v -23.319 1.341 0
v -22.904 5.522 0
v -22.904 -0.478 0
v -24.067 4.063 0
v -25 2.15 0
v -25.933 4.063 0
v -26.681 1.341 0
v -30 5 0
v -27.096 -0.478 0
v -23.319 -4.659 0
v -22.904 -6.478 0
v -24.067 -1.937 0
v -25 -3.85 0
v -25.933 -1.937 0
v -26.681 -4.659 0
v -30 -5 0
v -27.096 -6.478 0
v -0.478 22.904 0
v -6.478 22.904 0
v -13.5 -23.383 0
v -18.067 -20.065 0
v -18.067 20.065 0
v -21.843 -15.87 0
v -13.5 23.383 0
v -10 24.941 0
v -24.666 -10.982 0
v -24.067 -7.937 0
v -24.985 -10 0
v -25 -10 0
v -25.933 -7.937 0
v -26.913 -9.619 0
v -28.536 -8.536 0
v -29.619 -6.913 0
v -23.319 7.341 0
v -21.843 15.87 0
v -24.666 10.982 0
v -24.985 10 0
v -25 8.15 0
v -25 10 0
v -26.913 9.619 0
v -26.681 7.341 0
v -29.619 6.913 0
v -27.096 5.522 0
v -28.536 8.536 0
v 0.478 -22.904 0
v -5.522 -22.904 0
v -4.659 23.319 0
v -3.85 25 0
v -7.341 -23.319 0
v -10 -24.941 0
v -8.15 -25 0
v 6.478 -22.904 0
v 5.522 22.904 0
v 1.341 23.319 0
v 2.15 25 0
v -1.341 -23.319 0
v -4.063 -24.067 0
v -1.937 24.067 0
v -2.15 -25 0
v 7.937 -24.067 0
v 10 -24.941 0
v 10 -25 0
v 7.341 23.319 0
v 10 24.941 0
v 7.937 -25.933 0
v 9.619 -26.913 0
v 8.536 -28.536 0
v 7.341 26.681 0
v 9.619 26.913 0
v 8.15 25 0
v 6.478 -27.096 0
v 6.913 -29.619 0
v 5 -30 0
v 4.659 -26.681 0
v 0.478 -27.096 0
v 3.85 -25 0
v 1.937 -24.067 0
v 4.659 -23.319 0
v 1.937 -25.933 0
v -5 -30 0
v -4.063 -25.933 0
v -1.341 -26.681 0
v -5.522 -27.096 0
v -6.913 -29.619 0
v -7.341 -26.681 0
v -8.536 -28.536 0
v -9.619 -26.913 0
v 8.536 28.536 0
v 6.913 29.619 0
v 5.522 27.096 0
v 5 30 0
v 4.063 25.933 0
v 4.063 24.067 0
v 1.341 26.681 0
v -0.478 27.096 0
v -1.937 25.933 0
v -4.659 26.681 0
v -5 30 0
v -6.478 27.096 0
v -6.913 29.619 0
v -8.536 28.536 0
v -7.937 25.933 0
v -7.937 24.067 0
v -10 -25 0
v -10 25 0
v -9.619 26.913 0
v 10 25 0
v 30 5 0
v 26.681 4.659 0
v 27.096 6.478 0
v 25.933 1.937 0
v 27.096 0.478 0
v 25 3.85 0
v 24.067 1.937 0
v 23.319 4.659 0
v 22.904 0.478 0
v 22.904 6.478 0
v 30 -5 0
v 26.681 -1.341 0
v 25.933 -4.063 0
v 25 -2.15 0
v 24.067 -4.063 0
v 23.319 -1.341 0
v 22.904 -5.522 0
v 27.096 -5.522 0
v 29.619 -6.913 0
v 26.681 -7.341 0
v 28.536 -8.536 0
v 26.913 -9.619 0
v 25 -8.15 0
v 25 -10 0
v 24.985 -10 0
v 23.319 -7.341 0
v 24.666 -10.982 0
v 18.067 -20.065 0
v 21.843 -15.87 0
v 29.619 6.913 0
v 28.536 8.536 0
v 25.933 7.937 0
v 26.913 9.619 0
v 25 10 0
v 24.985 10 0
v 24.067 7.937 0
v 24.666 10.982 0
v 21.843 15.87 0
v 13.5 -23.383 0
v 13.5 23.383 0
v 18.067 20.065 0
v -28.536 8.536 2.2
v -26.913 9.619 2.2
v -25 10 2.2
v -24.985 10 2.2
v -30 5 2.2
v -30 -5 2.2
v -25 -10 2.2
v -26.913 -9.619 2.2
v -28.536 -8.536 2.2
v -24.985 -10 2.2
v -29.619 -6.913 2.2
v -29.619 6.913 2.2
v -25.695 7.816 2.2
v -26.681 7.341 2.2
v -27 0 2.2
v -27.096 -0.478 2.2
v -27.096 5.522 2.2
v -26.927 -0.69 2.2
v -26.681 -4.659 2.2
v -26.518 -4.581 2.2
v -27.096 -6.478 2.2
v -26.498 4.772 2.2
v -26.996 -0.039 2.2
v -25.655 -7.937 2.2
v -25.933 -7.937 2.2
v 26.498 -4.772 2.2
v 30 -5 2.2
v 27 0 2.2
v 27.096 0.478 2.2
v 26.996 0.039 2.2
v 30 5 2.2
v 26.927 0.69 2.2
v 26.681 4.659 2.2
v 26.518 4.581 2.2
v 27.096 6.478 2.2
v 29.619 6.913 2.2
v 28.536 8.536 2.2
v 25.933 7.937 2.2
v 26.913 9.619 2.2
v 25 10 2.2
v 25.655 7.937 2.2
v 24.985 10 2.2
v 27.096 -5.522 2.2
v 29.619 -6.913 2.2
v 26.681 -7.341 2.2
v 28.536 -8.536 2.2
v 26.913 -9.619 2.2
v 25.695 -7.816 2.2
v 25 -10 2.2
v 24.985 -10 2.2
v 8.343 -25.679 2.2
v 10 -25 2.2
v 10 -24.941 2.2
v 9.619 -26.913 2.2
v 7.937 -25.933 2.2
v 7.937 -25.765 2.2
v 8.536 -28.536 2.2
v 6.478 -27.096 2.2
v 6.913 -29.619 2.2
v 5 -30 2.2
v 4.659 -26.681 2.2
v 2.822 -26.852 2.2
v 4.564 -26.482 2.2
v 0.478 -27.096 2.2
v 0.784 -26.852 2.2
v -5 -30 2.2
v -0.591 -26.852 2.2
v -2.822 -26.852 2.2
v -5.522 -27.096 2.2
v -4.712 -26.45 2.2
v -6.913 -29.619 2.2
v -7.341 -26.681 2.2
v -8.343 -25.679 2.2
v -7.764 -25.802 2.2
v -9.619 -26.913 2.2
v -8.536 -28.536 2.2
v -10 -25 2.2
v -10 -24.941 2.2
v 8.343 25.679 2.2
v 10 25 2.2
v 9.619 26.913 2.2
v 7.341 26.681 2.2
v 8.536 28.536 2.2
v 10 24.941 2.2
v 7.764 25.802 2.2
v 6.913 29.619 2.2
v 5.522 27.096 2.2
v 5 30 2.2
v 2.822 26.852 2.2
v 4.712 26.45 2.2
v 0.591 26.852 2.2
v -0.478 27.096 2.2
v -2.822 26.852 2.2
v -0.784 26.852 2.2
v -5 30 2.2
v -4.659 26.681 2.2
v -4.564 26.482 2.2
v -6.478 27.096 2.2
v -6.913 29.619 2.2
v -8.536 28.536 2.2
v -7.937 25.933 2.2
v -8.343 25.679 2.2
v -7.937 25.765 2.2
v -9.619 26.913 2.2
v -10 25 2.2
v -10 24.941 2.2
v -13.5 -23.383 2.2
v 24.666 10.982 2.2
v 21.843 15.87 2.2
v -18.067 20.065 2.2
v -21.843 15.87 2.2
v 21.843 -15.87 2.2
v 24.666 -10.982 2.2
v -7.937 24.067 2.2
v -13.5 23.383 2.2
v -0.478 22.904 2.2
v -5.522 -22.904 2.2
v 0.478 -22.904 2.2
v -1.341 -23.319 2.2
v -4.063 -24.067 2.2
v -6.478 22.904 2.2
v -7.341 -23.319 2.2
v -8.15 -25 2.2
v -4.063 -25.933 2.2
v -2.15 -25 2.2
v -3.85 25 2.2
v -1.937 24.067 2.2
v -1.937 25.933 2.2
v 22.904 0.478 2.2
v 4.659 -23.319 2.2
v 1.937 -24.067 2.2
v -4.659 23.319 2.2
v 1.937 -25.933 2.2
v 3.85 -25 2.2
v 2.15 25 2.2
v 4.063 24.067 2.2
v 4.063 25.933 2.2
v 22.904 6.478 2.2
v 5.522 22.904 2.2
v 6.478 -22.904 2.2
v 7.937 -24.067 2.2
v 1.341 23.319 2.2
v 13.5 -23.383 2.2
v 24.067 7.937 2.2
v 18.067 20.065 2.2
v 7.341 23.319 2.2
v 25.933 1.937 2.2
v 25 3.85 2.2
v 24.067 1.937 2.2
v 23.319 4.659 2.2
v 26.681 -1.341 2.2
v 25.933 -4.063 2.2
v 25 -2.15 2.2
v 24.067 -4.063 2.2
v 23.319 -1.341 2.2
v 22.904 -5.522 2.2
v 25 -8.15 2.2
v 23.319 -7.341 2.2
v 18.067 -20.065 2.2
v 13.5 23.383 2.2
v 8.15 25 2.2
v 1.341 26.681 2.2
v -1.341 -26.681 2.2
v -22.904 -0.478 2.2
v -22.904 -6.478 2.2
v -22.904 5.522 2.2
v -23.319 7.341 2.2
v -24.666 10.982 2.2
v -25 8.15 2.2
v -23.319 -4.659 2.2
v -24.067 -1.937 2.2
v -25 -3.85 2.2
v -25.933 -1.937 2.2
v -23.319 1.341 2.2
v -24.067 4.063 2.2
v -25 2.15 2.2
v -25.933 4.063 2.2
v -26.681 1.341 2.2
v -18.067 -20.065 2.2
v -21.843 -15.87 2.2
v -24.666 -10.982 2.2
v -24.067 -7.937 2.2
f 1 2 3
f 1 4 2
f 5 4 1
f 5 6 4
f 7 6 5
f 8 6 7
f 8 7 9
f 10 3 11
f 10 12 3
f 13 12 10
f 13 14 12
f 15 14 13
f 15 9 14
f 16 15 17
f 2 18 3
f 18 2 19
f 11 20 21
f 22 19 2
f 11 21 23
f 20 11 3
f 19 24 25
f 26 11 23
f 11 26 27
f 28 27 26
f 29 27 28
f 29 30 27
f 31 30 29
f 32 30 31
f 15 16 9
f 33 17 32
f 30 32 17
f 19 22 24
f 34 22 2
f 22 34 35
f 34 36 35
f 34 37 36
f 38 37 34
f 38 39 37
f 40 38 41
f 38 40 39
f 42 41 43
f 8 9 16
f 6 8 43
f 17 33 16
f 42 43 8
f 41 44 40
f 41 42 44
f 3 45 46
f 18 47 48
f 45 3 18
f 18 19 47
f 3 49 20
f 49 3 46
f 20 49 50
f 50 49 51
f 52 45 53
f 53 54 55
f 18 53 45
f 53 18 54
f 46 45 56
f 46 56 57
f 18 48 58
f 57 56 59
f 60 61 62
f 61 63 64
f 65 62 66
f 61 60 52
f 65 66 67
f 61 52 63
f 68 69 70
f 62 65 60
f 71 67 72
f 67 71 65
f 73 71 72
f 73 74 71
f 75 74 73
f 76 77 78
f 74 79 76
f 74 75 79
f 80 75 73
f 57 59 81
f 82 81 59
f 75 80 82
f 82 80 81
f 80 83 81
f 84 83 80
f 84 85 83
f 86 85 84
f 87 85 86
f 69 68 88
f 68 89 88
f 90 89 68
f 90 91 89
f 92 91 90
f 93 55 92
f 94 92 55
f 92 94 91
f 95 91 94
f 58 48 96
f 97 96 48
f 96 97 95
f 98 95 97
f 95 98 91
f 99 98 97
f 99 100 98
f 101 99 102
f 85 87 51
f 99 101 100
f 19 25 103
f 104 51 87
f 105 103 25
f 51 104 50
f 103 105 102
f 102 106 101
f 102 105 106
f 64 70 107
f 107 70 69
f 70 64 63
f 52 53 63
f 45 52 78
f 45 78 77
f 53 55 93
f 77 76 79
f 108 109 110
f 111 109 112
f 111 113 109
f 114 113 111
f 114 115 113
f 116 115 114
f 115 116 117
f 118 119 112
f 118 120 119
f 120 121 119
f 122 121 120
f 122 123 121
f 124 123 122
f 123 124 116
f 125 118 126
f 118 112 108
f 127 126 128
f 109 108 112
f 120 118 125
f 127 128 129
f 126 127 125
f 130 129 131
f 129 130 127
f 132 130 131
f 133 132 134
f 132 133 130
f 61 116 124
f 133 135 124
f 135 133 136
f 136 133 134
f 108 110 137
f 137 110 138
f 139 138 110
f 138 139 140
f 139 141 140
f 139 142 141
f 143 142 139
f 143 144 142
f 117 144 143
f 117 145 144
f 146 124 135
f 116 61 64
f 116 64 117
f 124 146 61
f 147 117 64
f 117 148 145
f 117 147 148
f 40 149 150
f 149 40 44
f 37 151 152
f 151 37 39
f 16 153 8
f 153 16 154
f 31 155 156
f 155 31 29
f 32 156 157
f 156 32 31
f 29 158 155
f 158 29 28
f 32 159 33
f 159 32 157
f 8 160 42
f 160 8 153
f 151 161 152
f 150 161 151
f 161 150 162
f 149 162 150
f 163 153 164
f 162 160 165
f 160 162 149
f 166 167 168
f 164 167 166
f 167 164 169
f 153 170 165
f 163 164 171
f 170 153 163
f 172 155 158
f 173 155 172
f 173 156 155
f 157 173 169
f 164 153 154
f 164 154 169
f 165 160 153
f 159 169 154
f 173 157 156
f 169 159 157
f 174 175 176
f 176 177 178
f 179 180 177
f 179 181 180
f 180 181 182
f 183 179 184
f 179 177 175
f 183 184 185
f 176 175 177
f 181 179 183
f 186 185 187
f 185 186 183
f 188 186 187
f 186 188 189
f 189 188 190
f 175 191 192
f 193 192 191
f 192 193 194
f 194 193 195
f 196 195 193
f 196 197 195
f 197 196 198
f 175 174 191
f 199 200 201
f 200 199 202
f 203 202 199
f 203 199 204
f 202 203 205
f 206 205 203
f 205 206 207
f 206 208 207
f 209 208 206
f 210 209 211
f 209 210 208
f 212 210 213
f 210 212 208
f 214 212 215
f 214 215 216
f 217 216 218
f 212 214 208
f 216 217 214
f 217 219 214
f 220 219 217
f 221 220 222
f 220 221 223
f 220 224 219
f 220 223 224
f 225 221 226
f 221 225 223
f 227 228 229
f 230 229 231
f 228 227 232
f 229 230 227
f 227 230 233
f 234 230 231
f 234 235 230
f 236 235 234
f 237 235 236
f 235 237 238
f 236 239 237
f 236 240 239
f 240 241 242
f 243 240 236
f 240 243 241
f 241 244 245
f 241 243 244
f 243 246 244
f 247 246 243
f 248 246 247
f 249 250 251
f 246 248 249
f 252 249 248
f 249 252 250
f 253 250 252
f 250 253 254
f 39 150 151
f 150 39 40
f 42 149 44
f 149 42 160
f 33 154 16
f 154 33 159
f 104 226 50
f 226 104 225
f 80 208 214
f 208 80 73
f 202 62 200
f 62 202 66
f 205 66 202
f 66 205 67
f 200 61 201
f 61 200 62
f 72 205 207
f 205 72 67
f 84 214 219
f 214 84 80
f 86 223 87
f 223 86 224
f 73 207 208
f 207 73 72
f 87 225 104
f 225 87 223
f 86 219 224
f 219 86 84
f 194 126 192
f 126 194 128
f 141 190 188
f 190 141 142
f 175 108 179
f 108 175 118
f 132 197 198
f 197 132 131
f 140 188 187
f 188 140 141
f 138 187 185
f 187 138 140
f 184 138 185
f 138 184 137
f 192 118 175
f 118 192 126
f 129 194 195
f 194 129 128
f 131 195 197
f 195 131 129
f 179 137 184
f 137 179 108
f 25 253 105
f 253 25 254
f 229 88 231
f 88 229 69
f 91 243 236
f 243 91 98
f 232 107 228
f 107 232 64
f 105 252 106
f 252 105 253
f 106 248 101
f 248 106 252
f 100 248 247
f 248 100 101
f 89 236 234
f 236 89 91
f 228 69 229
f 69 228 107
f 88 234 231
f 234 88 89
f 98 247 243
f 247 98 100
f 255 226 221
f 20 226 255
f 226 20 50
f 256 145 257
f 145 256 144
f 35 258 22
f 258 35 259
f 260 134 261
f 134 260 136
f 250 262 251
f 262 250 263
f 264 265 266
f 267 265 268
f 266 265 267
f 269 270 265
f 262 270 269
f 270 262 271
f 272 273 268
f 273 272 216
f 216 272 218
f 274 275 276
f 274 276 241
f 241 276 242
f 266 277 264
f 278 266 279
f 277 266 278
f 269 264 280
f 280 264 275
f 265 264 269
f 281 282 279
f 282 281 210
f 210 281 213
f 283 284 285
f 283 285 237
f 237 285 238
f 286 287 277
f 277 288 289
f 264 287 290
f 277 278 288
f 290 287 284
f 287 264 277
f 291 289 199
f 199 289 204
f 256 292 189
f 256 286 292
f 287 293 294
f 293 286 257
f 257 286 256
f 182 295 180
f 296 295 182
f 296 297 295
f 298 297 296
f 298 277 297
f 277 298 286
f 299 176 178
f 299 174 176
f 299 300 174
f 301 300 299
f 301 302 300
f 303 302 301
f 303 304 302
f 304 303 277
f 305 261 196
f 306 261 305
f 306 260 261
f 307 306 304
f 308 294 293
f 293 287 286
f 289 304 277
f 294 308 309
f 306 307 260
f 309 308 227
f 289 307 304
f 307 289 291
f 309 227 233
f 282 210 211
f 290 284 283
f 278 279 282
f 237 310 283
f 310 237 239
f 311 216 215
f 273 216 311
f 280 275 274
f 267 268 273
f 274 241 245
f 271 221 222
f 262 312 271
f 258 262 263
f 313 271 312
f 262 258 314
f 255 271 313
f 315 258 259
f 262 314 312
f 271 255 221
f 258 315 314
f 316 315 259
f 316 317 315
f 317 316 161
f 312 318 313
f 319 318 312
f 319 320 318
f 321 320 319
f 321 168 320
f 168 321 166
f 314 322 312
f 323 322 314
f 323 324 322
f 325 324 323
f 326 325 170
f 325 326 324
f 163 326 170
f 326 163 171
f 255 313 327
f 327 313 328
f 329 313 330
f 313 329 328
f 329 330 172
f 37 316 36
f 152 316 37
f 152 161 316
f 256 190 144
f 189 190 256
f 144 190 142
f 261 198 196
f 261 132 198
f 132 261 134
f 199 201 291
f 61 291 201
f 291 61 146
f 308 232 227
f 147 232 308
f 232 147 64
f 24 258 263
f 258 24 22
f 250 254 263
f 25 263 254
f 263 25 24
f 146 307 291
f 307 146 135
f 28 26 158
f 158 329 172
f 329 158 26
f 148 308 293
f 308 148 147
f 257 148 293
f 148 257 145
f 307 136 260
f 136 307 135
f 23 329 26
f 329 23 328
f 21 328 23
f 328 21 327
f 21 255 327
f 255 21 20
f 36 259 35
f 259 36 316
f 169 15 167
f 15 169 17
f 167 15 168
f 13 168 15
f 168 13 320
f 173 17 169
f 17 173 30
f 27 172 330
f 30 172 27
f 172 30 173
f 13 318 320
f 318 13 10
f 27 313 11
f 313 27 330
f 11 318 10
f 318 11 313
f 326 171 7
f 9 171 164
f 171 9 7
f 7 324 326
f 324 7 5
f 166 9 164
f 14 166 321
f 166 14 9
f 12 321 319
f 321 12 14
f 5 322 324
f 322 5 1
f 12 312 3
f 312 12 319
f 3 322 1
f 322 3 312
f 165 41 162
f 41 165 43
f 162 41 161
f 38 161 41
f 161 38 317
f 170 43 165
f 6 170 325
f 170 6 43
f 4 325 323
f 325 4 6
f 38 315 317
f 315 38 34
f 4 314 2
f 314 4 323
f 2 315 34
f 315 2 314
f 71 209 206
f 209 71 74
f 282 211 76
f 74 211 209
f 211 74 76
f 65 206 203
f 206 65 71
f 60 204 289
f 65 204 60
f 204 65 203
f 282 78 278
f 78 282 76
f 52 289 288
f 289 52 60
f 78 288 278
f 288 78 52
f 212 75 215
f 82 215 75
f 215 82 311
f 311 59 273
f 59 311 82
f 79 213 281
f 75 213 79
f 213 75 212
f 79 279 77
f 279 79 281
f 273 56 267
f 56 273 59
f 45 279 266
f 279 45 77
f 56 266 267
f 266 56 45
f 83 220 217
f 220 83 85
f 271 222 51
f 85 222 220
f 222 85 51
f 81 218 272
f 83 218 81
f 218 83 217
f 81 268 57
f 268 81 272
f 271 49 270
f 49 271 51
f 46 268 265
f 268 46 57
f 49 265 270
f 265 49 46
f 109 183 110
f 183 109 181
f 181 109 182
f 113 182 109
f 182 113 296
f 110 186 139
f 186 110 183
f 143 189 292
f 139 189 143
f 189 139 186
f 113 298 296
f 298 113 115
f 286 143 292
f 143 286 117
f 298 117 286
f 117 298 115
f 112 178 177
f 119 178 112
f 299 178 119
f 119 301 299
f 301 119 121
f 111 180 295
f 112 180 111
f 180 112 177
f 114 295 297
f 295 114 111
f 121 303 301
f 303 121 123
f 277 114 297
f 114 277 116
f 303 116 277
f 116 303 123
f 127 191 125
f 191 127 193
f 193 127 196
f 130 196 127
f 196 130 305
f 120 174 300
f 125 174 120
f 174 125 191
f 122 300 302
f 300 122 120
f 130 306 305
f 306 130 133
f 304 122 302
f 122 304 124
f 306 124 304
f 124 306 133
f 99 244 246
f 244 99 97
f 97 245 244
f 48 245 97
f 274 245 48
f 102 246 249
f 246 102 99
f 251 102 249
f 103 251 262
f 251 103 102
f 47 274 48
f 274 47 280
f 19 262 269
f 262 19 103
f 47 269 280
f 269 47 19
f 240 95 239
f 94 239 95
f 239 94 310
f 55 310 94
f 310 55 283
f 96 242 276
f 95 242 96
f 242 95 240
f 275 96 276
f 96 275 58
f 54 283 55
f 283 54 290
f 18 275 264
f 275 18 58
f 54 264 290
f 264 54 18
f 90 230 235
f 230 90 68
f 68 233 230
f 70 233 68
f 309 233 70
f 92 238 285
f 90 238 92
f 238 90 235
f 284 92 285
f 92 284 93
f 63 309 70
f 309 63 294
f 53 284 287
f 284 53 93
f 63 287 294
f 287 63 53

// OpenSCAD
// file: ../util/rounded.scad
Collisions=false;

// Do a rounded cube
module rounded(x=10, y=10, z=10, r=3, center=false) {
    if (Collisions) {
        translate([0,0,center?(z/2):0])
            cube([x,y,z], center=center);
    } else {
        if (center) {
            translate([-(x/2),-(y/2),0])
                rounded(x, y, z, r);
        } else {
            translate([r,r,0])
                minkowski() {
                    cube([x-2*r,y-2*r,z/2]);
                    cylinder(h=z/2, r=r);
                }
        }
    }
}
// file: ../models/ollo.scad
Collisions=false;

// Diameter of plastic ollo holes
OlloHoles = 4.3;

// Width of Ollo "real" plastic
OlloWidth = 3;

// Distance between two ollo holes
OlloSpacing = 6;

// Do an Ollo hole on the part
module olloHole(depth=2.2, rivet=true)
{
    if (!Collisions) {
        if (rivet) {
            //:BOM "Ollo rivet" 0.05 http://www.robotis-shop-en.com/?act=shop_en.goods_view&GS=1605
        }
        translate([0,0,-0.1])
            cylinder(depth+0.2, OlloHoles/2, OlloHoles/2);
    }	    
}

// Do 3 ollo holes
module threeOllo(depth=2.2, rivets=true)
{
    for (xy=[[-OlloSpacing,0],[0,0],[OlloSpacing,0]]) {
        translate([xy[0], xy[1], 0])
            olloHole(depth, rivets);
    }
}

// Do a servo arm holes
module servoArm(depth=2.2, rivets=true)
{
    threeOllo(depth, rivets);
    rotate([0,0,90])
        threeOllo(depth);
}
// main file
include <../models/ollo.scad>;
use <../util/rounded.scad>;

//:Part
module body_plate(size=20, legs=4, thickness=2.2, double=false) {
    module bodyPart() {
        translate([-10,0,0])
            rounded(20, size+(double?18:0), thickness, 5);
    }

    module bodyHoles() {
        translate([0, size-5, 0]) {
            threeOllo(thickness*2);
	    if (double) {
		translate([0,3*OlloSpacing,0])    
		threeOllo(thickness*2);
	    }
        }
    }

    difference() {
        union() {
            cylinder(d=size*1.8, h=thickness);
            for (leg=[1:legs]) {
                if (legs > 0) {
                    rotate([0,0,360*leg/legs])
                        bodyPart();
                }
            }
        }
        for (leg=[1:legs]) {
            if (legs > 0) {
                rotate([0,0,360*leg/legs])
                    bodyHoles();
            }
        }
    }			
}

body_plate(size=30);
